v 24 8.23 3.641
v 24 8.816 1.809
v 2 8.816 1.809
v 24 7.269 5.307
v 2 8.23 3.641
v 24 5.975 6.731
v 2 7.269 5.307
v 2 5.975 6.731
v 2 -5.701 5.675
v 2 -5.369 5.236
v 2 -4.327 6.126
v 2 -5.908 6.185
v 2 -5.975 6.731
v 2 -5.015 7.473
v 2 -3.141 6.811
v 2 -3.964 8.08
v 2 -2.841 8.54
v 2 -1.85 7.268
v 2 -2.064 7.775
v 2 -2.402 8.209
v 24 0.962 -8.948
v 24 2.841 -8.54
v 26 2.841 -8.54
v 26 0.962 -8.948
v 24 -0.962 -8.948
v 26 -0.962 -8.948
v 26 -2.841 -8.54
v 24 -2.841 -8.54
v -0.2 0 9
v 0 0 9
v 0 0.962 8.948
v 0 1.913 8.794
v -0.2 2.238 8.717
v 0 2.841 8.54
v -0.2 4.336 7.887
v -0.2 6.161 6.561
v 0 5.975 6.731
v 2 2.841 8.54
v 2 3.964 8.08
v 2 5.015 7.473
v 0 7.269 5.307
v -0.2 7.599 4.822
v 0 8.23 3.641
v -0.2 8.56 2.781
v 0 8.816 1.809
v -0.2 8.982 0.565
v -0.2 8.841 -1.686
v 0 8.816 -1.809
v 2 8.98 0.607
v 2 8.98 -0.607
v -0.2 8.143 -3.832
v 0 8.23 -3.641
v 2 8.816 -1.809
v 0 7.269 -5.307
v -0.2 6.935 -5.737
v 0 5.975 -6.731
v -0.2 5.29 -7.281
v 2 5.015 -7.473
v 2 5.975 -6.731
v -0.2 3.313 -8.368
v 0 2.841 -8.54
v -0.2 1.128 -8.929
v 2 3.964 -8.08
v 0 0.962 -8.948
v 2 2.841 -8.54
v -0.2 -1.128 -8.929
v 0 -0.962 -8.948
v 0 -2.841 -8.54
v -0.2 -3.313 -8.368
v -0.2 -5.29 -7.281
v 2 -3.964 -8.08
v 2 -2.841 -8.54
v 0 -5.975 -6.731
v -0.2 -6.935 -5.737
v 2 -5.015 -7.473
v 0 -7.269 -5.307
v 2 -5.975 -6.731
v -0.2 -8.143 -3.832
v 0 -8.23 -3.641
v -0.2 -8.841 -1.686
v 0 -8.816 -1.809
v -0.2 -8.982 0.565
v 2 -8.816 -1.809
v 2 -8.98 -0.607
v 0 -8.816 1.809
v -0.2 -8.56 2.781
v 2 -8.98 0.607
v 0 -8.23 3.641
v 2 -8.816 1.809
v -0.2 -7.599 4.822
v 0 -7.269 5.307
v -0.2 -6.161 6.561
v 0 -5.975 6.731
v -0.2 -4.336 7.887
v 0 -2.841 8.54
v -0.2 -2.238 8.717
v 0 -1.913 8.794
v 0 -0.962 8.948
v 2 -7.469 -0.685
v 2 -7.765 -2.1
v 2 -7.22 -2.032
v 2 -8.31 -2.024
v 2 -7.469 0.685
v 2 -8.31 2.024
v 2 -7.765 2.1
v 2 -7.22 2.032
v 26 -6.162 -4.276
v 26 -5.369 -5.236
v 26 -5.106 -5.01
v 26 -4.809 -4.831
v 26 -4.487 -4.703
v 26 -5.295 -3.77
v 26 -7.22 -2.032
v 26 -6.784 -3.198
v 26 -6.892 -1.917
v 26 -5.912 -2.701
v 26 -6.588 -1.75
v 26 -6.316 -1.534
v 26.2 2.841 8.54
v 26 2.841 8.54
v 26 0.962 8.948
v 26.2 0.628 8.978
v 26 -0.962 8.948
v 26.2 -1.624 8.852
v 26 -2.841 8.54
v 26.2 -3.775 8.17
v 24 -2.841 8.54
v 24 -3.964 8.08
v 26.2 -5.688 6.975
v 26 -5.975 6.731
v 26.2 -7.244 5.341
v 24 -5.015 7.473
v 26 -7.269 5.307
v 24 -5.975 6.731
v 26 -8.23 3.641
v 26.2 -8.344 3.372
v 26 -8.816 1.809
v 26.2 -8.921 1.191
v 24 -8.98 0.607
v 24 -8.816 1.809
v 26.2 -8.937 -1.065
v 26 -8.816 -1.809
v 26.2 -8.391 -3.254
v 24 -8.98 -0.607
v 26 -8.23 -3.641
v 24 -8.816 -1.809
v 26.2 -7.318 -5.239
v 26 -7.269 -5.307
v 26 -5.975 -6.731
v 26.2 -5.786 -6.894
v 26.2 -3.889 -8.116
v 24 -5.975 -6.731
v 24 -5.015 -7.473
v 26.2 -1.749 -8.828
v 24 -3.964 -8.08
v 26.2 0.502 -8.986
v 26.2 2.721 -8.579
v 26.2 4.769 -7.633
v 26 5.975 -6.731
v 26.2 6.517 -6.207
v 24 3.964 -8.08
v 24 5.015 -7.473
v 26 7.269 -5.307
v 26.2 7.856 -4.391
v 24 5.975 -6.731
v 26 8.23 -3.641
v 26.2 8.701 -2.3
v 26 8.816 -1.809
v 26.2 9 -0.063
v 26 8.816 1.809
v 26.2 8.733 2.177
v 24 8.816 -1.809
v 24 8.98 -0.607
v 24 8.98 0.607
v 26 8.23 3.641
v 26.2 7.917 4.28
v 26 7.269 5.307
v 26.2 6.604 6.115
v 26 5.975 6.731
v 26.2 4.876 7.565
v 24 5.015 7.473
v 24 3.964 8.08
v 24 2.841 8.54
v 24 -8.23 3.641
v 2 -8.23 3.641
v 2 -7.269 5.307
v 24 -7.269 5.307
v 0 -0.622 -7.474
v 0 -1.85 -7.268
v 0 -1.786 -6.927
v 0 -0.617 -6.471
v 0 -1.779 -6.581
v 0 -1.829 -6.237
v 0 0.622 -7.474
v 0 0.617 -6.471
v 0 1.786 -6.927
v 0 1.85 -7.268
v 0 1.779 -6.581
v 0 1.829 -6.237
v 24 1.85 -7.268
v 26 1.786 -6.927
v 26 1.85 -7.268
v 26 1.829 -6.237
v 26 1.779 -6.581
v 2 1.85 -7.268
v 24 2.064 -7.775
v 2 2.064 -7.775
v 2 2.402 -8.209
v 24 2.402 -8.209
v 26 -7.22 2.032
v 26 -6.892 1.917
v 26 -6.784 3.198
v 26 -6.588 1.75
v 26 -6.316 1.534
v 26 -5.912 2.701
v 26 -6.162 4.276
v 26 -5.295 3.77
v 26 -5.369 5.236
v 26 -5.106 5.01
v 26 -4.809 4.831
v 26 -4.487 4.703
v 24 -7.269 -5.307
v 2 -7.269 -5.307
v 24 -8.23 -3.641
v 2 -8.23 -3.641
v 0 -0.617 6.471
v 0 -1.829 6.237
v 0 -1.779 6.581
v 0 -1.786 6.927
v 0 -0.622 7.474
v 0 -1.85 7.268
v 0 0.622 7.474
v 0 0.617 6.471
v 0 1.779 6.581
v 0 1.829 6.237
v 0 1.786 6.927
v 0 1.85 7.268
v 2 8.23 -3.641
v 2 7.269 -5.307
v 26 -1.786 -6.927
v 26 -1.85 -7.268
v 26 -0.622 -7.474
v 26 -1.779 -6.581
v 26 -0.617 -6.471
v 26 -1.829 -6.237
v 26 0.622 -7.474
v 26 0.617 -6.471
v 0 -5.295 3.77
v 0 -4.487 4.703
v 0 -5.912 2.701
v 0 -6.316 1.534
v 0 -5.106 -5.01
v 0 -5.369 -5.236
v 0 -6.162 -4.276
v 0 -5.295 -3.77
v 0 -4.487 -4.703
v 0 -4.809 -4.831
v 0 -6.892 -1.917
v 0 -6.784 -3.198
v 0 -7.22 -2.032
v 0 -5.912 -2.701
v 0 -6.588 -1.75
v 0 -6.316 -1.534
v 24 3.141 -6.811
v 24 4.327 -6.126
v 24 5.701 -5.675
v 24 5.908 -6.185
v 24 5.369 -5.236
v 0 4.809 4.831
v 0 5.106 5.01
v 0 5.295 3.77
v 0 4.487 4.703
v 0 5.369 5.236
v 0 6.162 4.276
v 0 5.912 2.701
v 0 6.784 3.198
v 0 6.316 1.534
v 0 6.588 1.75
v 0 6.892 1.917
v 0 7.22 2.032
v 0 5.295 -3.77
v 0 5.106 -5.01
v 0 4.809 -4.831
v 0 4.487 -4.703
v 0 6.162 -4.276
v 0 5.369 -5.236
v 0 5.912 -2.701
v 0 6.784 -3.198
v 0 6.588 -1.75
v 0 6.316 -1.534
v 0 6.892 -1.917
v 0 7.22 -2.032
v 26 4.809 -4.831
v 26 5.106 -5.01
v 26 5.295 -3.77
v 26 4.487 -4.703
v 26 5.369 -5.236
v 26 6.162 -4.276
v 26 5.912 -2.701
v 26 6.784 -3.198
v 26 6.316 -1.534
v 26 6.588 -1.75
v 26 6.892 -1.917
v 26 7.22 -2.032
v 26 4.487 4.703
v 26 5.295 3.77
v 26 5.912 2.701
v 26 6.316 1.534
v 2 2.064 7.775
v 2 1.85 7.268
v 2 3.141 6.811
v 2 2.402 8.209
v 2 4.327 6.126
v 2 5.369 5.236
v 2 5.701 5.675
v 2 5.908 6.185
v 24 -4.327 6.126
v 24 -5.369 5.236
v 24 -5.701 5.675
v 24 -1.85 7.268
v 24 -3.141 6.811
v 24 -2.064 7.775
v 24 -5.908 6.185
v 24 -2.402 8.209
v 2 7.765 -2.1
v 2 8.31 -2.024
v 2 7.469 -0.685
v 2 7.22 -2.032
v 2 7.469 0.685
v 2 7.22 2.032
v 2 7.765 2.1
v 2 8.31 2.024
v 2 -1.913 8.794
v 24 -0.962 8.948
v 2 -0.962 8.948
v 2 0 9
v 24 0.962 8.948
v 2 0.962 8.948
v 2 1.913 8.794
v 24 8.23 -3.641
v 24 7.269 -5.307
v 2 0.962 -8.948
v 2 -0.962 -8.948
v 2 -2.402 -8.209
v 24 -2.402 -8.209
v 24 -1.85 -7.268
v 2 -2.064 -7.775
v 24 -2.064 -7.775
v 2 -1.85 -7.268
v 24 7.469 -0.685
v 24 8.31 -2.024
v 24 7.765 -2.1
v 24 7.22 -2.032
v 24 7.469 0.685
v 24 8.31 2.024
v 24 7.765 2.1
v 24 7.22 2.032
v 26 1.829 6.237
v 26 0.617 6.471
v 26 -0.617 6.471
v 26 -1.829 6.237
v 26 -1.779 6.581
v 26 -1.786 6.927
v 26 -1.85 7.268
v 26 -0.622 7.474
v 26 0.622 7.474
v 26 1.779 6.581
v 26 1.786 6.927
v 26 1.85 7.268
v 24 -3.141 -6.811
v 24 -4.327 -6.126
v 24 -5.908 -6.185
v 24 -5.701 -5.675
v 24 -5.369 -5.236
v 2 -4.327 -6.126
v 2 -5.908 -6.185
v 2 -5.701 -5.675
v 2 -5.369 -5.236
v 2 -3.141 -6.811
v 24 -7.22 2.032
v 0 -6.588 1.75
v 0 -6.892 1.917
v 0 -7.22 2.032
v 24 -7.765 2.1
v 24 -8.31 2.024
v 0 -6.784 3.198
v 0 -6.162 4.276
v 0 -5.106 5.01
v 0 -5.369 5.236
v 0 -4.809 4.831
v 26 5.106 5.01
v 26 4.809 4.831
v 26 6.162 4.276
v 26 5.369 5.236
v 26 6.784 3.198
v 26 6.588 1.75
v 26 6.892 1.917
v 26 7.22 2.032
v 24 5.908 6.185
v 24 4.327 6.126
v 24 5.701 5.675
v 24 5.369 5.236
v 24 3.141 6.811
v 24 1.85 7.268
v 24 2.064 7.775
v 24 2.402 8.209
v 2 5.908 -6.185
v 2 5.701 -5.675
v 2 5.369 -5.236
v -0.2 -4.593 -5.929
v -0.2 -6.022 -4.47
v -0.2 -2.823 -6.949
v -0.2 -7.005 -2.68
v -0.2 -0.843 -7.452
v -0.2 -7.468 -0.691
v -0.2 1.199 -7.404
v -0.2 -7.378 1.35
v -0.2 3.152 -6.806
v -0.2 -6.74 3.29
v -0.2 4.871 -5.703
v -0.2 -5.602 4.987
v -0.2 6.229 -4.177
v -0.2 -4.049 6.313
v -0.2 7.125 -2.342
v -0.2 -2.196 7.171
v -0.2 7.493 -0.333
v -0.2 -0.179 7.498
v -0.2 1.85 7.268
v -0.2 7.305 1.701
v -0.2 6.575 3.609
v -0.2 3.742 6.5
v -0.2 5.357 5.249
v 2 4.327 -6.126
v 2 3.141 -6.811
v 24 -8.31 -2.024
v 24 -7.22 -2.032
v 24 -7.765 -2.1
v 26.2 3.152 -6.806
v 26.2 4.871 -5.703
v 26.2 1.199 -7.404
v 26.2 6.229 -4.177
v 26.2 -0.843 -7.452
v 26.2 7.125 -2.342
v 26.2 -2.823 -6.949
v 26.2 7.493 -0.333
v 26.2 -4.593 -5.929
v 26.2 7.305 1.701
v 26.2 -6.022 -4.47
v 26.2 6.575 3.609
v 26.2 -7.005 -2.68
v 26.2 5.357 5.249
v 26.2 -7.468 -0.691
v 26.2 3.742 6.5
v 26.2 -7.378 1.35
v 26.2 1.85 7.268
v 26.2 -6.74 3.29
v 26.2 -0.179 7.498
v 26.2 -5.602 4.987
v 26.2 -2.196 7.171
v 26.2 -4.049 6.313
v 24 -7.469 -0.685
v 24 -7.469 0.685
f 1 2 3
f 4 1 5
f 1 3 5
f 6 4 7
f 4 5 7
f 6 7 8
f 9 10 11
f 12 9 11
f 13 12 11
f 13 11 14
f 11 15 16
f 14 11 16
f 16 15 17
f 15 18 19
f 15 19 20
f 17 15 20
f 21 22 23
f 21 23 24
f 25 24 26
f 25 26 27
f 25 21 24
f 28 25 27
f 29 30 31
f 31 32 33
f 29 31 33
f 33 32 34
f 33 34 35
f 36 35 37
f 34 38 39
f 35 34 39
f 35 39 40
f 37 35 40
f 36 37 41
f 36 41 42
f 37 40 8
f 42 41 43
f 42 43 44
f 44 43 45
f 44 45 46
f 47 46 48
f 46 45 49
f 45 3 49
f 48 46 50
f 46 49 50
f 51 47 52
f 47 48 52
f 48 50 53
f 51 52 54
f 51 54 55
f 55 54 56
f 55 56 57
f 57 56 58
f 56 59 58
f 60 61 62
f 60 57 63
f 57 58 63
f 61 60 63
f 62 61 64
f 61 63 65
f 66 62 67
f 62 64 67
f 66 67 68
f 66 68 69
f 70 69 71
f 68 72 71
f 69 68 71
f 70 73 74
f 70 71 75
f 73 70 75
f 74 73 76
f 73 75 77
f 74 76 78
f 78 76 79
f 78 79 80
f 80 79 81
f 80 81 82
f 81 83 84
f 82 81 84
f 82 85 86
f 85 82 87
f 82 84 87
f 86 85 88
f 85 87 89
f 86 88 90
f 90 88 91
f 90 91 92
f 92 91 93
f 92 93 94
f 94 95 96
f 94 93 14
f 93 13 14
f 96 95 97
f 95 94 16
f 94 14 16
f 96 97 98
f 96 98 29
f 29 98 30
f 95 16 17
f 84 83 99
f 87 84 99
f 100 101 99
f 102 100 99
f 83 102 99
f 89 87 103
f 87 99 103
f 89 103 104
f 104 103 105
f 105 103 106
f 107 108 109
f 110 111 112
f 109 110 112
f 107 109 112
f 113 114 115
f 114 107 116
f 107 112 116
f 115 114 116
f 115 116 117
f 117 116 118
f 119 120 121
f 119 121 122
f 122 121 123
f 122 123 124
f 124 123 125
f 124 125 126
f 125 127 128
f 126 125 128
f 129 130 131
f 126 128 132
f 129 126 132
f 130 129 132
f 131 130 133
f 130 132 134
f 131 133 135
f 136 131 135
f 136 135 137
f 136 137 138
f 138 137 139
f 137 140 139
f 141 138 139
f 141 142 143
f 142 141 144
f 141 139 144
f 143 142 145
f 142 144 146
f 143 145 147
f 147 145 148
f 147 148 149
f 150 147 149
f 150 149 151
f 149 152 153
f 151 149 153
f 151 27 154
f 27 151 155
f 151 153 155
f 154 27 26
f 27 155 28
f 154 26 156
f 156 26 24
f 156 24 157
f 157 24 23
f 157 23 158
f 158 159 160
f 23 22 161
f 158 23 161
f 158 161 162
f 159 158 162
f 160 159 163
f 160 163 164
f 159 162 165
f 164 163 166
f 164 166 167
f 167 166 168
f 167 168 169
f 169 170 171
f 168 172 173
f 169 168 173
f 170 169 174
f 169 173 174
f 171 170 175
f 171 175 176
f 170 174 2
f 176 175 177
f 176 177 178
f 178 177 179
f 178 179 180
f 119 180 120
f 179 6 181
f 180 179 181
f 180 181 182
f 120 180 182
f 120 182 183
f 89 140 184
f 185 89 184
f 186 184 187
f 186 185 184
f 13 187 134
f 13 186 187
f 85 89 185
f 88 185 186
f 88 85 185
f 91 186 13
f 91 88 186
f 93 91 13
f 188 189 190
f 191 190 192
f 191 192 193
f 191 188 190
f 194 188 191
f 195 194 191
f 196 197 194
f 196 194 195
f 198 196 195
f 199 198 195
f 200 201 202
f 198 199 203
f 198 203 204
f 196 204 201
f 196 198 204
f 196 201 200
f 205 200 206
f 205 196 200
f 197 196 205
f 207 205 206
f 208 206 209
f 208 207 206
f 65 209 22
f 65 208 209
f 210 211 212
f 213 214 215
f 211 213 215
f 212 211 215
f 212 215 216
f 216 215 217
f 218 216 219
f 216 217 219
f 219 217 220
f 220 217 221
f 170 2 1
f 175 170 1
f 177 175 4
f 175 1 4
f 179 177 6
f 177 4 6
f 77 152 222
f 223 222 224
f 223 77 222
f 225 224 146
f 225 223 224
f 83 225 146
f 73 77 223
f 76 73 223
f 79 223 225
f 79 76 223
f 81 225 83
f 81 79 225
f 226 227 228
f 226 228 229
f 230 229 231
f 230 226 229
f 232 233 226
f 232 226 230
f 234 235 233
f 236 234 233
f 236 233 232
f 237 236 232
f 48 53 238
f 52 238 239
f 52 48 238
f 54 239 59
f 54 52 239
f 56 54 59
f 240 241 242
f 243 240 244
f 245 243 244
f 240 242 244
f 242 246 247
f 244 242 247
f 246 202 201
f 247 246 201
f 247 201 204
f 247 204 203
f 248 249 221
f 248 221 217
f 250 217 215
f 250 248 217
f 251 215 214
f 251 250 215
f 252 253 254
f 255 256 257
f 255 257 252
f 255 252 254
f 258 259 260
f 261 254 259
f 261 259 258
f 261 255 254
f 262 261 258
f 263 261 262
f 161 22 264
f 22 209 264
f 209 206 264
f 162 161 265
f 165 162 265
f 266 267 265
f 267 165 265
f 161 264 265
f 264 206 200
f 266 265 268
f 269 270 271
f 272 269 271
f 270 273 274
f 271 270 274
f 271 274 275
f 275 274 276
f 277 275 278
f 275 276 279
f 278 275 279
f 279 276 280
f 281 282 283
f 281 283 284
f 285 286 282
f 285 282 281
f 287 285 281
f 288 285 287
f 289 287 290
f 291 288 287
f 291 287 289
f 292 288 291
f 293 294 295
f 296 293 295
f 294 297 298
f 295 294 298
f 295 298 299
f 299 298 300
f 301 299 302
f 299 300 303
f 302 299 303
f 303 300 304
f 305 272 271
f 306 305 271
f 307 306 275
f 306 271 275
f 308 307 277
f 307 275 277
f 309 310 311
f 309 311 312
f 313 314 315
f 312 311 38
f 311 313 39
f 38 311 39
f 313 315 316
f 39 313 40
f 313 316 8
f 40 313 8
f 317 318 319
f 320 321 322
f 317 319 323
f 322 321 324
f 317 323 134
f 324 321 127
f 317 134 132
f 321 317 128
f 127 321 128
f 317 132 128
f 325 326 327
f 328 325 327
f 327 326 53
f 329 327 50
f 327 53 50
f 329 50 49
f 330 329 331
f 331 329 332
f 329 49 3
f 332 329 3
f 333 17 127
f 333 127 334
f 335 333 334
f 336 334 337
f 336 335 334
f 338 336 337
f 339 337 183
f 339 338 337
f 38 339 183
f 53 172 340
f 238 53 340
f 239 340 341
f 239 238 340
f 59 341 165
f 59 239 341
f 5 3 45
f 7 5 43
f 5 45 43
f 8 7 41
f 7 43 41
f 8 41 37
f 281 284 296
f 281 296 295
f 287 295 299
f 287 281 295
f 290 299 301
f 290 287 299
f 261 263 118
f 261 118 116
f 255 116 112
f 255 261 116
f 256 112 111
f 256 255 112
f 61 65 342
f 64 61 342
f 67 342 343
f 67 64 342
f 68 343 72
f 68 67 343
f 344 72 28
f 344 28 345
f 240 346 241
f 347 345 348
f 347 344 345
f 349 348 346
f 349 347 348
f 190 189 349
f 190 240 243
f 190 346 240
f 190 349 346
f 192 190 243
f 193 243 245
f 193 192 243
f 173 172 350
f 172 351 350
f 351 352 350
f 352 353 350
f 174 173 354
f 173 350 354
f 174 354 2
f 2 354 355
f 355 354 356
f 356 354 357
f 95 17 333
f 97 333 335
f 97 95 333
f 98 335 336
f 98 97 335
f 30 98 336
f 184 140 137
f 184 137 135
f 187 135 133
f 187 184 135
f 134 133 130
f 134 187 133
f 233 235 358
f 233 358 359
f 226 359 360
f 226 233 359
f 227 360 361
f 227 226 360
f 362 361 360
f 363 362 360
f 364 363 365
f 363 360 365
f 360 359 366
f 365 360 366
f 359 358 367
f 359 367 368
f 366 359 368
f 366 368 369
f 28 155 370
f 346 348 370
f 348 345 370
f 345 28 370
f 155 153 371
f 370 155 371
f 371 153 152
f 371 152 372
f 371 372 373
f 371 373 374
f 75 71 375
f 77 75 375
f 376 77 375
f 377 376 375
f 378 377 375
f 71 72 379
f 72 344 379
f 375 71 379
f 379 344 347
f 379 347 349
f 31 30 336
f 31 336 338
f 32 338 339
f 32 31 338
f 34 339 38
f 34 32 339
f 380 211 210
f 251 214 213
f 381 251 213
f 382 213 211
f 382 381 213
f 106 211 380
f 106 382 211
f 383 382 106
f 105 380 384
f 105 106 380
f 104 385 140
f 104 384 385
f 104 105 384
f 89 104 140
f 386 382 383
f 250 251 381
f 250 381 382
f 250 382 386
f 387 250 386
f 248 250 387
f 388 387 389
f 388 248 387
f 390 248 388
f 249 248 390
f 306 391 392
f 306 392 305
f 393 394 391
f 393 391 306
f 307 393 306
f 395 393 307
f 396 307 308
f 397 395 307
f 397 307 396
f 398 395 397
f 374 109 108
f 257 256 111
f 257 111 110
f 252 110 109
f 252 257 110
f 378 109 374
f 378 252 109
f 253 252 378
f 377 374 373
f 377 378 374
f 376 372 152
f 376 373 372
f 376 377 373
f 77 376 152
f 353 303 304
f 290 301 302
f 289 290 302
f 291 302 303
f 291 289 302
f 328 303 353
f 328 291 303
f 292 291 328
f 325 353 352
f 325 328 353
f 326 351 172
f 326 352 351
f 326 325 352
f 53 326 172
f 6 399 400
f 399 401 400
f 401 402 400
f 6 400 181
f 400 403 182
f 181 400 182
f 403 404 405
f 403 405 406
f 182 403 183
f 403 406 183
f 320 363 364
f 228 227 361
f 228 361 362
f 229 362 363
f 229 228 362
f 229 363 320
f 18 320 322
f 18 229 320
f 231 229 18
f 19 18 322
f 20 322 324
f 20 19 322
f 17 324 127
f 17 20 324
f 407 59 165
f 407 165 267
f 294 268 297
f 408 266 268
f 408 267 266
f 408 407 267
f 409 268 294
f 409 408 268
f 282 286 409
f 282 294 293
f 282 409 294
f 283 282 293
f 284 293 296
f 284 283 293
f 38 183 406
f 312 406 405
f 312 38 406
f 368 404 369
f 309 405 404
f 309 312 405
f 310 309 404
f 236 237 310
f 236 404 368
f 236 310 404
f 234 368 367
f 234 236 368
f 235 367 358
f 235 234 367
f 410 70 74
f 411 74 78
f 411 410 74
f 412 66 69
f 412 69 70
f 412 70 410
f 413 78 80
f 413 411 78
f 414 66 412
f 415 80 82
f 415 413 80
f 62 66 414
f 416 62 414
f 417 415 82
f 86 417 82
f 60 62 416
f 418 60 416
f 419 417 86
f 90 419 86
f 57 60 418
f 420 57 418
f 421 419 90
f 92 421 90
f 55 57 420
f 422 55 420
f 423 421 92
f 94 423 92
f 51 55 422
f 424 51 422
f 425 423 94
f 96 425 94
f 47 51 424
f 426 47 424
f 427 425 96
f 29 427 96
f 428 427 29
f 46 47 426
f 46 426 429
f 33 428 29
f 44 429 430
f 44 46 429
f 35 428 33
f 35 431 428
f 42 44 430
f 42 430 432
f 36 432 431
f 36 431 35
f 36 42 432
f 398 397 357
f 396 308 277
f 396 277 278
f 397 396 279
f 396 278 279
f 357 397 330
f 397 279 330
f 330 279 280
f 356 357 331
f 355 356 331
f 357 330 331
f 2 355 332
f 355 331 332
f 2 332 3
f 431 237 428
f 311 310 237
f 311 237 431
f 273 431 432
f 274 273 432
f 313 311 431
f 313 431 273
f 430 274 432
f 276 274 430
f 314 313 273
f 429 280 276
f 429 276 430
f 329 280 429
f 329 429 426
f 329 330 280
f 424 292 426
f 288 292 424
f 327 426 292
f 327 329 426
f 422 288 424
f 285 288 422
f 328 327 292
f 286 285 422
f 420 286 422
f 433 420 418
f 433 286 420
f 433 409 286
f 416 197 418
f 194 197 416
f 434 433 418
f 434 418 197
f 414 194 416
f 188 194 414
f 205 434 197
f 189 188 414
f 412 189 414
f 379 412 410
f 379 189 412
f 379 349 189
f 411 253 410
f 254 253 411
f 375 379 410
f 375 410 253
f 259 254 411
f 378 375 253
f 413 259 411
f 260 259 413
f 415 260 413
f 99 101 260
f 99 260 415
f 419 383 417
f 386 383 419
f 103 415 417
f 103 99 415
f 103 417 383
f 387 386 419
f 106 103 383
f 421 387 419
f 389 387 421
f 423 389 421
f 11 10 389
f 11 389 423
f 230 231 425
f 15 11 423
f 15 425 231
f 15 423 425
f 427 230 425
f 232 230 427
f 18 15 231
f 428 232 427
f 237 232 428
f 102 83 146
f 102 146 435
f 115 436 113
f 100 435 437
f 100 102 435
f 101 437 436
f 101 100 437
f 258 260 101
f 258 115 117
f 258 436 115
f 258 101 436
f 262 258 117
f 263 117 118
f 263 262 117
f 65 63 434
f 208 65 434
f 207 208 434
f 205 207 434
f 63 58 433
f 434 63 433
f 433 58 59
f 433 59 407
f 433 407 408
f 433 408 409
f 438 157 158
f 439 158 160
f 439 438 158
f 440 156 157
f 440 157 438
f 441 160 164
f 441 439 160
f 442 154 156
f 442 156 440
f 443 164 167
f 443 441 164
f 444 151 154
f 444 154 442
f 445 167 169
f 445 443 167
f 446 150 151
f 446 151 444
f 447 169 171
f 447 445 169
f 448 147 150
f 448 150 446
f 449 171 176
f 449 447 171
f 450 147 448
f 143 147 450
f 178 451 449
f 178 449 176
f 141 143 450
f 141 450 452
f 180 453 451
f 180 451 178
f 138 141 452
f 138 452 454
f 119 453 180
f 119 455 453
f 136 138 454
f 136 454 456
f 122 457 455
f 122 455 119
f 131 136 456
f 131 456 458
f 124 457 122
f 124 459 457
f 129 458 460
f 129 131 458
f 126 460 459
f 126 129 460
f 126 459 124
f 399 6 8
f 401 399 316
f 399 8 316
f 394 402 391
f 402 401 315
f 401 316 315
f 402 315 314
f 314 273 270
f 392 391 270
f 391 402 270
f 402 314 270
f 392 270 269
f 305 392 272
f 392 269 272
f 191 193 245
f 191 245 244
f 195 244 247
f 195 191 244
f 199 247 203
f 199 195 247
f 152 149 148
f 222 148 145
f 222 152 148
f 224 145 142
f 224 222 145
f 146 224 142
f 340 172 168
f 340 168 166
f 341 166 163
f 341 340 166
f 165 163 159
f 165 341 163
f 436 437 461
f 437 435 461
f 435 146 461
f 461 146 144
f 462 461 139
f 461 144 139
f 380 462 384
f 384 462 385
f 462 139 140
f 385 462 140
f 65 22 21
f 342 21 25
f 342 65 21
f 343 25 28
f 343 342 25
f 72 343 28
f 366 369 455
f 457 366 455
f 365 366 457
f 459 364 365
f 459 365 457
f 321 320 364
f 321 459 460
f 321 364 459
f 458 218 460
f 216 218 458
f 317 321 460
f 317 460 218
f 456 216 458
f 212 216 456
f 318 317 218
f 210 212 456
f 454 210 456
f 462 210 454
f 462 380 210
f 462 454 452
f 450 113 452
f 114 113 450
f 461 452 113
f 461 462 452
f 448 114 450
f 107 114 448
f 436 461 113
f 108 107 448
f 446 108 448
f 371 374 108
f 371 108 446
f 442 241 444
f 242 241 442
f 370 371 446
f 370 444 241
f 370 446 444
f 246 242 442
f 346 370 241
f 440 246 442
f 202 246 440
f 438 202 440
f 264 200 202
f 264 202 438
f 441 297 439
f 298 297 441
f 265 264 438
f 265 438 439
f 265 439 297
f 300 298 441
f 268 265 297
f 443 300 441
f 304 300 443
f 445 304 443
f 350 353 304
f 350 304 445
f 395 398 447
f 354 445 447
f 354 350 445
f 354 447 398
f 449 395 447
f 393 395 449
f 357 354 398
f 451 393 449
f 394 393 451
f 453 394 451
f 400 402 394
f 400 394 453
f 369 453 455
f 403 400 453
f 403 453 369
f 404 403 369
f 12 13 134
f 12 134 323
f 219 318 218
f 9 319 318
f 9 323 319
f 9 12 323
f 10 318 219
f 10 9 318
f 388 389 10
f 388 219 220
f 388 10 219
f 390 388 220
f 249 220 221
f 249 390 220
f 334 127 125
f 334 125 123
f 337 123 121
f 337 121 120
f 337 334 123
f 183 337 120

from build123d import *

# Parameters (mm, degrees)
BOSS_EXTRUDE1_DEPTH      = 26
BOSS_EXTRUDE1_2_DEPTH    = 26
BOSS_EXTRUDE1_3_DEPTH    = 26
BOSS_EXTRUDE1_4_DEPTH    = 26
BOSS_EXTRUDE1_5_DEPTH    = 26
BOSS_EXTRUDE1_6_DEPTH    = 26
BOSS_EXTRUDE2_DEPTH      = 0.2
BOSS_EXTRUDE2_DEPTH_BACK = 2
SKETCH2_R                = 9
SKETCH2_R_2              = 7.5
BOSS_EXTRUDE3_DEPTH      = 0.2
BOSS_EXTRUDE3_DEPTH_BACK = 2
SKETCH3_R                = 9
SKETCH3_R_2              = 7.5


with BuildPart() as part:
    # Sketch1 → Boss-Extrude1 (new body)
    with BuildSketch(Plane(origin=(0, 0, 0), x_dir=(0, 0, -1), z_dir=(1, 0, 0))):
        with BuildLine():
            ThreePointArc((-1.809150339, 8.816290323), (-4.5, 7.794228634), (-6.730556217, 5.974915314))
            ThreePointArc((-6.730556217, 5.974915314), (-5.469327251, 5.568079356), (-4.702852692, 4.487000842))
            ThreePointArc((-4.702852692, 4.487000842), (-3.25, 5.629165125), (-1.53443037, 6.316290323))
            ThreePointArc((-1.53443037, 6.316290323), (-2.087434547, 7.520616019), (-1.809150339, 8.816290323))
        make_face()
    extrude(amount=BOSS_EXTRUDE1_DEPTH)



with BuildPart() as body_2:
    # Sketch1 → Boss-Extrude1 2 (new body)
    with BuildSketch(Plane(origin=(0, 0, 0), x_dir=(0, 0, -1), z_dir=(1, 0, 0))):
        with BuildLine():
            ThreePointArc((6.237283062, 1.82928948), (7.556761798, 1.952536663), (8.539706556, 2.841375009))
            ThreePointArc((8.539706556, 2.841375009), (9, 0), (8.539706556, -2.841375009))
            ThreePointArc((8.539706556, -2.841375009), (7.556761798, -1.952536663), (6.237283062, -1.82928948))
            ThreePointArc((6.237283062, -1.82928948), (6.5, 0), (6.237283062, 1.82928948))
        make_face()
    extrude(amount=BOSS_EXTRUDE1_2_DEPTH)


with BuildPart() as body_3:
    # Sketch1 → Boss-Extrude1 3 (new body)
    with BuildSketch(Plane(origin=(0, 0, 0), x_dir=(0, 0, -1), z_dir=(1, 0, 0))):
        with BuildLine():
            ThreePointArc((-1.53443037, -6.316290323), (-2.087434547, -7.520616019), (-1.809150339, -8.816290323))
            ThreePointArc((-1.809150339, -8.816290323), (-4.5, -7.794228634), (-6.730556217, -5.974915314))
            ThreePointArc((-6.730556217, -5.974915314), (-5.469327251, -5.568079356), (-4.702852692, -4.487000842))
            ThreePointArc((-4.702852692, -4.487000842), (-3.25, -5.629165125), (-1.53443037, -6.316290323))
        make_face()
    extrude(amount=BOSS_EXTRUDE1_3_DEPTH)


with BuildPart() as body_4:
    # Sketch1 → Boss-Extrude1 4 (new body)
    with BuildSketch(Plane(origin=(0, 0, 0), x_dir=(0, 0, -1), z_dir=(1, 0, 0))):
        with BuildLine():
            ThreePointArc((1.53443037, 6.316290323), (2.087434547, 7.520616019), (1.809150339, 8.816290323))
            ThreePointArc((1.809150339, 8.816290323), (4.5, 7.794228634), (6.730556217, 5.974915314))
            ThreePointArc((6.730556217, 5.974915314), (5.469327251, 5.568079356), (4.702852692, 4.487000842))
            ThreePointArc((4.702852692, 4.487000842), (3.25, 5.629165125), (1.53443037, 6.316290323))
        make_face()
    extrude(amount=BOSS_EXTRUDE1_4_DEPTH)


with BuildPart() as body_5:
    # Sketch1 → Boss-Extrude1 5 (new body)
    with BuildSketch(Plane(origin=(0, 0, 0), x_dir=(0, 0, -1), z_dir=(1, 0, 0))):
        with BuildLine():
            ThreePointArc((-6.237283062, 1.82928948), (-6.5, 0), (-6.237283062, -1.82928948))
            ThreePointArc((-6.237283062, -1.82928948), (-7.556761798, -1.952536663), (-8.539706556, -2.841375009))
            ThreePointArc((-8.539706556, -2.841375009), (-9, 0), (-8.539706556, 2.841375009))
            ThreePointArc((-8.539706556, 2.841375009), (-7.556761798, 1.952536663), (-6.237283062, 1.82928948))
        make_face()
    extrude(amount=BOSS_EXTRUDE1_5_DEPTH)


with BuildPart() as body_6:
    # Sketch1 → Boss-Extrude1 6 (new body)
    with BuildSketch(Plane(origin=(0, 0, 0), x_dir=(0, 0, -1), z_dir=(1, 0, 0))):
        with BuildLine():
            ThreePointArc((4.702852692, -4.487000842), (5.469327251, -5.568079356), (6.730556217, -5.974915314))
            ThreePointArc((6.730556217, -5.974915314), (4.5, -7.794228634), (1.809150339, -8.816290323))
            ThreePointArc((1.809150339, -8.816290323), (2.087434547, -7.520616019), (1.53443037, -6.316290323))
            ThreePointArc((1.53443037, -6.316290323), (3.25, -5.629165125), (4.702852692, -4.487000842))
        make_face()
    extrude(amount=BOSS_EXTRUDE1_6_DEPTH)


with BuildPart() as part_1:
    add(part.part)

    add(body_2.part)  # Boss-Extrude2 merges body 2

    add(body_3.part)  # Boss-Extrude2 merges body 3

    add(body_4.part)  # Boss-Extrude2 merges body 4

    add(body_5.part)  # Boss-Extrude2 merges body 5

    add(body_6.part)  # Boss-Extrude2 merges body 6
    # Sketch2 → Boss-Extrude2 (add, two sides: drawn at the far end of the back side and taken through both)
    with BuildSketch(Plane(origin=(26, 0, 0), x_dir=(0, 0, -1), z_dir=(1, 0, 0)).offset(-BOSS_EXTRUDE2_DEPTH_BACK)):
        with Locations(Location((0, 0, 0), (0, 0, 161.596419423))):
            Circle(SKETCH2_R)
        with Locations(Location((0, 0, 0), (0, 0, 165.71895949))):
            Circle(SKETCH2_R_2, mode=Mode.SUBTRACT)
    extrude(amount=BOSS_EXTRUDE2_DEPTH + BOSS_EXTRUDE2_DEPTH_BACK)

    # Sketch3 → Boss-Extrude3 (add, two sides: drawn at the far end of the back side and taken through both)
    with BuildSketch(Plane.ZY.offset(-BOSS_EXTRUDE3_DEPTH_BACK)):
        Circle(SKETCH3_R)
        with Locations(Location((0, 0, 0), (0, 0, 14.28104051))):
            Circle(SKETCH3_R_2, mode=Mode.SUBTRACT)
    extrude(amount=BOSS_EXTRUDE3_DEPTH + BOSS_EXTRUDE3_DEPTH_BACK)


solid = part_1.part
